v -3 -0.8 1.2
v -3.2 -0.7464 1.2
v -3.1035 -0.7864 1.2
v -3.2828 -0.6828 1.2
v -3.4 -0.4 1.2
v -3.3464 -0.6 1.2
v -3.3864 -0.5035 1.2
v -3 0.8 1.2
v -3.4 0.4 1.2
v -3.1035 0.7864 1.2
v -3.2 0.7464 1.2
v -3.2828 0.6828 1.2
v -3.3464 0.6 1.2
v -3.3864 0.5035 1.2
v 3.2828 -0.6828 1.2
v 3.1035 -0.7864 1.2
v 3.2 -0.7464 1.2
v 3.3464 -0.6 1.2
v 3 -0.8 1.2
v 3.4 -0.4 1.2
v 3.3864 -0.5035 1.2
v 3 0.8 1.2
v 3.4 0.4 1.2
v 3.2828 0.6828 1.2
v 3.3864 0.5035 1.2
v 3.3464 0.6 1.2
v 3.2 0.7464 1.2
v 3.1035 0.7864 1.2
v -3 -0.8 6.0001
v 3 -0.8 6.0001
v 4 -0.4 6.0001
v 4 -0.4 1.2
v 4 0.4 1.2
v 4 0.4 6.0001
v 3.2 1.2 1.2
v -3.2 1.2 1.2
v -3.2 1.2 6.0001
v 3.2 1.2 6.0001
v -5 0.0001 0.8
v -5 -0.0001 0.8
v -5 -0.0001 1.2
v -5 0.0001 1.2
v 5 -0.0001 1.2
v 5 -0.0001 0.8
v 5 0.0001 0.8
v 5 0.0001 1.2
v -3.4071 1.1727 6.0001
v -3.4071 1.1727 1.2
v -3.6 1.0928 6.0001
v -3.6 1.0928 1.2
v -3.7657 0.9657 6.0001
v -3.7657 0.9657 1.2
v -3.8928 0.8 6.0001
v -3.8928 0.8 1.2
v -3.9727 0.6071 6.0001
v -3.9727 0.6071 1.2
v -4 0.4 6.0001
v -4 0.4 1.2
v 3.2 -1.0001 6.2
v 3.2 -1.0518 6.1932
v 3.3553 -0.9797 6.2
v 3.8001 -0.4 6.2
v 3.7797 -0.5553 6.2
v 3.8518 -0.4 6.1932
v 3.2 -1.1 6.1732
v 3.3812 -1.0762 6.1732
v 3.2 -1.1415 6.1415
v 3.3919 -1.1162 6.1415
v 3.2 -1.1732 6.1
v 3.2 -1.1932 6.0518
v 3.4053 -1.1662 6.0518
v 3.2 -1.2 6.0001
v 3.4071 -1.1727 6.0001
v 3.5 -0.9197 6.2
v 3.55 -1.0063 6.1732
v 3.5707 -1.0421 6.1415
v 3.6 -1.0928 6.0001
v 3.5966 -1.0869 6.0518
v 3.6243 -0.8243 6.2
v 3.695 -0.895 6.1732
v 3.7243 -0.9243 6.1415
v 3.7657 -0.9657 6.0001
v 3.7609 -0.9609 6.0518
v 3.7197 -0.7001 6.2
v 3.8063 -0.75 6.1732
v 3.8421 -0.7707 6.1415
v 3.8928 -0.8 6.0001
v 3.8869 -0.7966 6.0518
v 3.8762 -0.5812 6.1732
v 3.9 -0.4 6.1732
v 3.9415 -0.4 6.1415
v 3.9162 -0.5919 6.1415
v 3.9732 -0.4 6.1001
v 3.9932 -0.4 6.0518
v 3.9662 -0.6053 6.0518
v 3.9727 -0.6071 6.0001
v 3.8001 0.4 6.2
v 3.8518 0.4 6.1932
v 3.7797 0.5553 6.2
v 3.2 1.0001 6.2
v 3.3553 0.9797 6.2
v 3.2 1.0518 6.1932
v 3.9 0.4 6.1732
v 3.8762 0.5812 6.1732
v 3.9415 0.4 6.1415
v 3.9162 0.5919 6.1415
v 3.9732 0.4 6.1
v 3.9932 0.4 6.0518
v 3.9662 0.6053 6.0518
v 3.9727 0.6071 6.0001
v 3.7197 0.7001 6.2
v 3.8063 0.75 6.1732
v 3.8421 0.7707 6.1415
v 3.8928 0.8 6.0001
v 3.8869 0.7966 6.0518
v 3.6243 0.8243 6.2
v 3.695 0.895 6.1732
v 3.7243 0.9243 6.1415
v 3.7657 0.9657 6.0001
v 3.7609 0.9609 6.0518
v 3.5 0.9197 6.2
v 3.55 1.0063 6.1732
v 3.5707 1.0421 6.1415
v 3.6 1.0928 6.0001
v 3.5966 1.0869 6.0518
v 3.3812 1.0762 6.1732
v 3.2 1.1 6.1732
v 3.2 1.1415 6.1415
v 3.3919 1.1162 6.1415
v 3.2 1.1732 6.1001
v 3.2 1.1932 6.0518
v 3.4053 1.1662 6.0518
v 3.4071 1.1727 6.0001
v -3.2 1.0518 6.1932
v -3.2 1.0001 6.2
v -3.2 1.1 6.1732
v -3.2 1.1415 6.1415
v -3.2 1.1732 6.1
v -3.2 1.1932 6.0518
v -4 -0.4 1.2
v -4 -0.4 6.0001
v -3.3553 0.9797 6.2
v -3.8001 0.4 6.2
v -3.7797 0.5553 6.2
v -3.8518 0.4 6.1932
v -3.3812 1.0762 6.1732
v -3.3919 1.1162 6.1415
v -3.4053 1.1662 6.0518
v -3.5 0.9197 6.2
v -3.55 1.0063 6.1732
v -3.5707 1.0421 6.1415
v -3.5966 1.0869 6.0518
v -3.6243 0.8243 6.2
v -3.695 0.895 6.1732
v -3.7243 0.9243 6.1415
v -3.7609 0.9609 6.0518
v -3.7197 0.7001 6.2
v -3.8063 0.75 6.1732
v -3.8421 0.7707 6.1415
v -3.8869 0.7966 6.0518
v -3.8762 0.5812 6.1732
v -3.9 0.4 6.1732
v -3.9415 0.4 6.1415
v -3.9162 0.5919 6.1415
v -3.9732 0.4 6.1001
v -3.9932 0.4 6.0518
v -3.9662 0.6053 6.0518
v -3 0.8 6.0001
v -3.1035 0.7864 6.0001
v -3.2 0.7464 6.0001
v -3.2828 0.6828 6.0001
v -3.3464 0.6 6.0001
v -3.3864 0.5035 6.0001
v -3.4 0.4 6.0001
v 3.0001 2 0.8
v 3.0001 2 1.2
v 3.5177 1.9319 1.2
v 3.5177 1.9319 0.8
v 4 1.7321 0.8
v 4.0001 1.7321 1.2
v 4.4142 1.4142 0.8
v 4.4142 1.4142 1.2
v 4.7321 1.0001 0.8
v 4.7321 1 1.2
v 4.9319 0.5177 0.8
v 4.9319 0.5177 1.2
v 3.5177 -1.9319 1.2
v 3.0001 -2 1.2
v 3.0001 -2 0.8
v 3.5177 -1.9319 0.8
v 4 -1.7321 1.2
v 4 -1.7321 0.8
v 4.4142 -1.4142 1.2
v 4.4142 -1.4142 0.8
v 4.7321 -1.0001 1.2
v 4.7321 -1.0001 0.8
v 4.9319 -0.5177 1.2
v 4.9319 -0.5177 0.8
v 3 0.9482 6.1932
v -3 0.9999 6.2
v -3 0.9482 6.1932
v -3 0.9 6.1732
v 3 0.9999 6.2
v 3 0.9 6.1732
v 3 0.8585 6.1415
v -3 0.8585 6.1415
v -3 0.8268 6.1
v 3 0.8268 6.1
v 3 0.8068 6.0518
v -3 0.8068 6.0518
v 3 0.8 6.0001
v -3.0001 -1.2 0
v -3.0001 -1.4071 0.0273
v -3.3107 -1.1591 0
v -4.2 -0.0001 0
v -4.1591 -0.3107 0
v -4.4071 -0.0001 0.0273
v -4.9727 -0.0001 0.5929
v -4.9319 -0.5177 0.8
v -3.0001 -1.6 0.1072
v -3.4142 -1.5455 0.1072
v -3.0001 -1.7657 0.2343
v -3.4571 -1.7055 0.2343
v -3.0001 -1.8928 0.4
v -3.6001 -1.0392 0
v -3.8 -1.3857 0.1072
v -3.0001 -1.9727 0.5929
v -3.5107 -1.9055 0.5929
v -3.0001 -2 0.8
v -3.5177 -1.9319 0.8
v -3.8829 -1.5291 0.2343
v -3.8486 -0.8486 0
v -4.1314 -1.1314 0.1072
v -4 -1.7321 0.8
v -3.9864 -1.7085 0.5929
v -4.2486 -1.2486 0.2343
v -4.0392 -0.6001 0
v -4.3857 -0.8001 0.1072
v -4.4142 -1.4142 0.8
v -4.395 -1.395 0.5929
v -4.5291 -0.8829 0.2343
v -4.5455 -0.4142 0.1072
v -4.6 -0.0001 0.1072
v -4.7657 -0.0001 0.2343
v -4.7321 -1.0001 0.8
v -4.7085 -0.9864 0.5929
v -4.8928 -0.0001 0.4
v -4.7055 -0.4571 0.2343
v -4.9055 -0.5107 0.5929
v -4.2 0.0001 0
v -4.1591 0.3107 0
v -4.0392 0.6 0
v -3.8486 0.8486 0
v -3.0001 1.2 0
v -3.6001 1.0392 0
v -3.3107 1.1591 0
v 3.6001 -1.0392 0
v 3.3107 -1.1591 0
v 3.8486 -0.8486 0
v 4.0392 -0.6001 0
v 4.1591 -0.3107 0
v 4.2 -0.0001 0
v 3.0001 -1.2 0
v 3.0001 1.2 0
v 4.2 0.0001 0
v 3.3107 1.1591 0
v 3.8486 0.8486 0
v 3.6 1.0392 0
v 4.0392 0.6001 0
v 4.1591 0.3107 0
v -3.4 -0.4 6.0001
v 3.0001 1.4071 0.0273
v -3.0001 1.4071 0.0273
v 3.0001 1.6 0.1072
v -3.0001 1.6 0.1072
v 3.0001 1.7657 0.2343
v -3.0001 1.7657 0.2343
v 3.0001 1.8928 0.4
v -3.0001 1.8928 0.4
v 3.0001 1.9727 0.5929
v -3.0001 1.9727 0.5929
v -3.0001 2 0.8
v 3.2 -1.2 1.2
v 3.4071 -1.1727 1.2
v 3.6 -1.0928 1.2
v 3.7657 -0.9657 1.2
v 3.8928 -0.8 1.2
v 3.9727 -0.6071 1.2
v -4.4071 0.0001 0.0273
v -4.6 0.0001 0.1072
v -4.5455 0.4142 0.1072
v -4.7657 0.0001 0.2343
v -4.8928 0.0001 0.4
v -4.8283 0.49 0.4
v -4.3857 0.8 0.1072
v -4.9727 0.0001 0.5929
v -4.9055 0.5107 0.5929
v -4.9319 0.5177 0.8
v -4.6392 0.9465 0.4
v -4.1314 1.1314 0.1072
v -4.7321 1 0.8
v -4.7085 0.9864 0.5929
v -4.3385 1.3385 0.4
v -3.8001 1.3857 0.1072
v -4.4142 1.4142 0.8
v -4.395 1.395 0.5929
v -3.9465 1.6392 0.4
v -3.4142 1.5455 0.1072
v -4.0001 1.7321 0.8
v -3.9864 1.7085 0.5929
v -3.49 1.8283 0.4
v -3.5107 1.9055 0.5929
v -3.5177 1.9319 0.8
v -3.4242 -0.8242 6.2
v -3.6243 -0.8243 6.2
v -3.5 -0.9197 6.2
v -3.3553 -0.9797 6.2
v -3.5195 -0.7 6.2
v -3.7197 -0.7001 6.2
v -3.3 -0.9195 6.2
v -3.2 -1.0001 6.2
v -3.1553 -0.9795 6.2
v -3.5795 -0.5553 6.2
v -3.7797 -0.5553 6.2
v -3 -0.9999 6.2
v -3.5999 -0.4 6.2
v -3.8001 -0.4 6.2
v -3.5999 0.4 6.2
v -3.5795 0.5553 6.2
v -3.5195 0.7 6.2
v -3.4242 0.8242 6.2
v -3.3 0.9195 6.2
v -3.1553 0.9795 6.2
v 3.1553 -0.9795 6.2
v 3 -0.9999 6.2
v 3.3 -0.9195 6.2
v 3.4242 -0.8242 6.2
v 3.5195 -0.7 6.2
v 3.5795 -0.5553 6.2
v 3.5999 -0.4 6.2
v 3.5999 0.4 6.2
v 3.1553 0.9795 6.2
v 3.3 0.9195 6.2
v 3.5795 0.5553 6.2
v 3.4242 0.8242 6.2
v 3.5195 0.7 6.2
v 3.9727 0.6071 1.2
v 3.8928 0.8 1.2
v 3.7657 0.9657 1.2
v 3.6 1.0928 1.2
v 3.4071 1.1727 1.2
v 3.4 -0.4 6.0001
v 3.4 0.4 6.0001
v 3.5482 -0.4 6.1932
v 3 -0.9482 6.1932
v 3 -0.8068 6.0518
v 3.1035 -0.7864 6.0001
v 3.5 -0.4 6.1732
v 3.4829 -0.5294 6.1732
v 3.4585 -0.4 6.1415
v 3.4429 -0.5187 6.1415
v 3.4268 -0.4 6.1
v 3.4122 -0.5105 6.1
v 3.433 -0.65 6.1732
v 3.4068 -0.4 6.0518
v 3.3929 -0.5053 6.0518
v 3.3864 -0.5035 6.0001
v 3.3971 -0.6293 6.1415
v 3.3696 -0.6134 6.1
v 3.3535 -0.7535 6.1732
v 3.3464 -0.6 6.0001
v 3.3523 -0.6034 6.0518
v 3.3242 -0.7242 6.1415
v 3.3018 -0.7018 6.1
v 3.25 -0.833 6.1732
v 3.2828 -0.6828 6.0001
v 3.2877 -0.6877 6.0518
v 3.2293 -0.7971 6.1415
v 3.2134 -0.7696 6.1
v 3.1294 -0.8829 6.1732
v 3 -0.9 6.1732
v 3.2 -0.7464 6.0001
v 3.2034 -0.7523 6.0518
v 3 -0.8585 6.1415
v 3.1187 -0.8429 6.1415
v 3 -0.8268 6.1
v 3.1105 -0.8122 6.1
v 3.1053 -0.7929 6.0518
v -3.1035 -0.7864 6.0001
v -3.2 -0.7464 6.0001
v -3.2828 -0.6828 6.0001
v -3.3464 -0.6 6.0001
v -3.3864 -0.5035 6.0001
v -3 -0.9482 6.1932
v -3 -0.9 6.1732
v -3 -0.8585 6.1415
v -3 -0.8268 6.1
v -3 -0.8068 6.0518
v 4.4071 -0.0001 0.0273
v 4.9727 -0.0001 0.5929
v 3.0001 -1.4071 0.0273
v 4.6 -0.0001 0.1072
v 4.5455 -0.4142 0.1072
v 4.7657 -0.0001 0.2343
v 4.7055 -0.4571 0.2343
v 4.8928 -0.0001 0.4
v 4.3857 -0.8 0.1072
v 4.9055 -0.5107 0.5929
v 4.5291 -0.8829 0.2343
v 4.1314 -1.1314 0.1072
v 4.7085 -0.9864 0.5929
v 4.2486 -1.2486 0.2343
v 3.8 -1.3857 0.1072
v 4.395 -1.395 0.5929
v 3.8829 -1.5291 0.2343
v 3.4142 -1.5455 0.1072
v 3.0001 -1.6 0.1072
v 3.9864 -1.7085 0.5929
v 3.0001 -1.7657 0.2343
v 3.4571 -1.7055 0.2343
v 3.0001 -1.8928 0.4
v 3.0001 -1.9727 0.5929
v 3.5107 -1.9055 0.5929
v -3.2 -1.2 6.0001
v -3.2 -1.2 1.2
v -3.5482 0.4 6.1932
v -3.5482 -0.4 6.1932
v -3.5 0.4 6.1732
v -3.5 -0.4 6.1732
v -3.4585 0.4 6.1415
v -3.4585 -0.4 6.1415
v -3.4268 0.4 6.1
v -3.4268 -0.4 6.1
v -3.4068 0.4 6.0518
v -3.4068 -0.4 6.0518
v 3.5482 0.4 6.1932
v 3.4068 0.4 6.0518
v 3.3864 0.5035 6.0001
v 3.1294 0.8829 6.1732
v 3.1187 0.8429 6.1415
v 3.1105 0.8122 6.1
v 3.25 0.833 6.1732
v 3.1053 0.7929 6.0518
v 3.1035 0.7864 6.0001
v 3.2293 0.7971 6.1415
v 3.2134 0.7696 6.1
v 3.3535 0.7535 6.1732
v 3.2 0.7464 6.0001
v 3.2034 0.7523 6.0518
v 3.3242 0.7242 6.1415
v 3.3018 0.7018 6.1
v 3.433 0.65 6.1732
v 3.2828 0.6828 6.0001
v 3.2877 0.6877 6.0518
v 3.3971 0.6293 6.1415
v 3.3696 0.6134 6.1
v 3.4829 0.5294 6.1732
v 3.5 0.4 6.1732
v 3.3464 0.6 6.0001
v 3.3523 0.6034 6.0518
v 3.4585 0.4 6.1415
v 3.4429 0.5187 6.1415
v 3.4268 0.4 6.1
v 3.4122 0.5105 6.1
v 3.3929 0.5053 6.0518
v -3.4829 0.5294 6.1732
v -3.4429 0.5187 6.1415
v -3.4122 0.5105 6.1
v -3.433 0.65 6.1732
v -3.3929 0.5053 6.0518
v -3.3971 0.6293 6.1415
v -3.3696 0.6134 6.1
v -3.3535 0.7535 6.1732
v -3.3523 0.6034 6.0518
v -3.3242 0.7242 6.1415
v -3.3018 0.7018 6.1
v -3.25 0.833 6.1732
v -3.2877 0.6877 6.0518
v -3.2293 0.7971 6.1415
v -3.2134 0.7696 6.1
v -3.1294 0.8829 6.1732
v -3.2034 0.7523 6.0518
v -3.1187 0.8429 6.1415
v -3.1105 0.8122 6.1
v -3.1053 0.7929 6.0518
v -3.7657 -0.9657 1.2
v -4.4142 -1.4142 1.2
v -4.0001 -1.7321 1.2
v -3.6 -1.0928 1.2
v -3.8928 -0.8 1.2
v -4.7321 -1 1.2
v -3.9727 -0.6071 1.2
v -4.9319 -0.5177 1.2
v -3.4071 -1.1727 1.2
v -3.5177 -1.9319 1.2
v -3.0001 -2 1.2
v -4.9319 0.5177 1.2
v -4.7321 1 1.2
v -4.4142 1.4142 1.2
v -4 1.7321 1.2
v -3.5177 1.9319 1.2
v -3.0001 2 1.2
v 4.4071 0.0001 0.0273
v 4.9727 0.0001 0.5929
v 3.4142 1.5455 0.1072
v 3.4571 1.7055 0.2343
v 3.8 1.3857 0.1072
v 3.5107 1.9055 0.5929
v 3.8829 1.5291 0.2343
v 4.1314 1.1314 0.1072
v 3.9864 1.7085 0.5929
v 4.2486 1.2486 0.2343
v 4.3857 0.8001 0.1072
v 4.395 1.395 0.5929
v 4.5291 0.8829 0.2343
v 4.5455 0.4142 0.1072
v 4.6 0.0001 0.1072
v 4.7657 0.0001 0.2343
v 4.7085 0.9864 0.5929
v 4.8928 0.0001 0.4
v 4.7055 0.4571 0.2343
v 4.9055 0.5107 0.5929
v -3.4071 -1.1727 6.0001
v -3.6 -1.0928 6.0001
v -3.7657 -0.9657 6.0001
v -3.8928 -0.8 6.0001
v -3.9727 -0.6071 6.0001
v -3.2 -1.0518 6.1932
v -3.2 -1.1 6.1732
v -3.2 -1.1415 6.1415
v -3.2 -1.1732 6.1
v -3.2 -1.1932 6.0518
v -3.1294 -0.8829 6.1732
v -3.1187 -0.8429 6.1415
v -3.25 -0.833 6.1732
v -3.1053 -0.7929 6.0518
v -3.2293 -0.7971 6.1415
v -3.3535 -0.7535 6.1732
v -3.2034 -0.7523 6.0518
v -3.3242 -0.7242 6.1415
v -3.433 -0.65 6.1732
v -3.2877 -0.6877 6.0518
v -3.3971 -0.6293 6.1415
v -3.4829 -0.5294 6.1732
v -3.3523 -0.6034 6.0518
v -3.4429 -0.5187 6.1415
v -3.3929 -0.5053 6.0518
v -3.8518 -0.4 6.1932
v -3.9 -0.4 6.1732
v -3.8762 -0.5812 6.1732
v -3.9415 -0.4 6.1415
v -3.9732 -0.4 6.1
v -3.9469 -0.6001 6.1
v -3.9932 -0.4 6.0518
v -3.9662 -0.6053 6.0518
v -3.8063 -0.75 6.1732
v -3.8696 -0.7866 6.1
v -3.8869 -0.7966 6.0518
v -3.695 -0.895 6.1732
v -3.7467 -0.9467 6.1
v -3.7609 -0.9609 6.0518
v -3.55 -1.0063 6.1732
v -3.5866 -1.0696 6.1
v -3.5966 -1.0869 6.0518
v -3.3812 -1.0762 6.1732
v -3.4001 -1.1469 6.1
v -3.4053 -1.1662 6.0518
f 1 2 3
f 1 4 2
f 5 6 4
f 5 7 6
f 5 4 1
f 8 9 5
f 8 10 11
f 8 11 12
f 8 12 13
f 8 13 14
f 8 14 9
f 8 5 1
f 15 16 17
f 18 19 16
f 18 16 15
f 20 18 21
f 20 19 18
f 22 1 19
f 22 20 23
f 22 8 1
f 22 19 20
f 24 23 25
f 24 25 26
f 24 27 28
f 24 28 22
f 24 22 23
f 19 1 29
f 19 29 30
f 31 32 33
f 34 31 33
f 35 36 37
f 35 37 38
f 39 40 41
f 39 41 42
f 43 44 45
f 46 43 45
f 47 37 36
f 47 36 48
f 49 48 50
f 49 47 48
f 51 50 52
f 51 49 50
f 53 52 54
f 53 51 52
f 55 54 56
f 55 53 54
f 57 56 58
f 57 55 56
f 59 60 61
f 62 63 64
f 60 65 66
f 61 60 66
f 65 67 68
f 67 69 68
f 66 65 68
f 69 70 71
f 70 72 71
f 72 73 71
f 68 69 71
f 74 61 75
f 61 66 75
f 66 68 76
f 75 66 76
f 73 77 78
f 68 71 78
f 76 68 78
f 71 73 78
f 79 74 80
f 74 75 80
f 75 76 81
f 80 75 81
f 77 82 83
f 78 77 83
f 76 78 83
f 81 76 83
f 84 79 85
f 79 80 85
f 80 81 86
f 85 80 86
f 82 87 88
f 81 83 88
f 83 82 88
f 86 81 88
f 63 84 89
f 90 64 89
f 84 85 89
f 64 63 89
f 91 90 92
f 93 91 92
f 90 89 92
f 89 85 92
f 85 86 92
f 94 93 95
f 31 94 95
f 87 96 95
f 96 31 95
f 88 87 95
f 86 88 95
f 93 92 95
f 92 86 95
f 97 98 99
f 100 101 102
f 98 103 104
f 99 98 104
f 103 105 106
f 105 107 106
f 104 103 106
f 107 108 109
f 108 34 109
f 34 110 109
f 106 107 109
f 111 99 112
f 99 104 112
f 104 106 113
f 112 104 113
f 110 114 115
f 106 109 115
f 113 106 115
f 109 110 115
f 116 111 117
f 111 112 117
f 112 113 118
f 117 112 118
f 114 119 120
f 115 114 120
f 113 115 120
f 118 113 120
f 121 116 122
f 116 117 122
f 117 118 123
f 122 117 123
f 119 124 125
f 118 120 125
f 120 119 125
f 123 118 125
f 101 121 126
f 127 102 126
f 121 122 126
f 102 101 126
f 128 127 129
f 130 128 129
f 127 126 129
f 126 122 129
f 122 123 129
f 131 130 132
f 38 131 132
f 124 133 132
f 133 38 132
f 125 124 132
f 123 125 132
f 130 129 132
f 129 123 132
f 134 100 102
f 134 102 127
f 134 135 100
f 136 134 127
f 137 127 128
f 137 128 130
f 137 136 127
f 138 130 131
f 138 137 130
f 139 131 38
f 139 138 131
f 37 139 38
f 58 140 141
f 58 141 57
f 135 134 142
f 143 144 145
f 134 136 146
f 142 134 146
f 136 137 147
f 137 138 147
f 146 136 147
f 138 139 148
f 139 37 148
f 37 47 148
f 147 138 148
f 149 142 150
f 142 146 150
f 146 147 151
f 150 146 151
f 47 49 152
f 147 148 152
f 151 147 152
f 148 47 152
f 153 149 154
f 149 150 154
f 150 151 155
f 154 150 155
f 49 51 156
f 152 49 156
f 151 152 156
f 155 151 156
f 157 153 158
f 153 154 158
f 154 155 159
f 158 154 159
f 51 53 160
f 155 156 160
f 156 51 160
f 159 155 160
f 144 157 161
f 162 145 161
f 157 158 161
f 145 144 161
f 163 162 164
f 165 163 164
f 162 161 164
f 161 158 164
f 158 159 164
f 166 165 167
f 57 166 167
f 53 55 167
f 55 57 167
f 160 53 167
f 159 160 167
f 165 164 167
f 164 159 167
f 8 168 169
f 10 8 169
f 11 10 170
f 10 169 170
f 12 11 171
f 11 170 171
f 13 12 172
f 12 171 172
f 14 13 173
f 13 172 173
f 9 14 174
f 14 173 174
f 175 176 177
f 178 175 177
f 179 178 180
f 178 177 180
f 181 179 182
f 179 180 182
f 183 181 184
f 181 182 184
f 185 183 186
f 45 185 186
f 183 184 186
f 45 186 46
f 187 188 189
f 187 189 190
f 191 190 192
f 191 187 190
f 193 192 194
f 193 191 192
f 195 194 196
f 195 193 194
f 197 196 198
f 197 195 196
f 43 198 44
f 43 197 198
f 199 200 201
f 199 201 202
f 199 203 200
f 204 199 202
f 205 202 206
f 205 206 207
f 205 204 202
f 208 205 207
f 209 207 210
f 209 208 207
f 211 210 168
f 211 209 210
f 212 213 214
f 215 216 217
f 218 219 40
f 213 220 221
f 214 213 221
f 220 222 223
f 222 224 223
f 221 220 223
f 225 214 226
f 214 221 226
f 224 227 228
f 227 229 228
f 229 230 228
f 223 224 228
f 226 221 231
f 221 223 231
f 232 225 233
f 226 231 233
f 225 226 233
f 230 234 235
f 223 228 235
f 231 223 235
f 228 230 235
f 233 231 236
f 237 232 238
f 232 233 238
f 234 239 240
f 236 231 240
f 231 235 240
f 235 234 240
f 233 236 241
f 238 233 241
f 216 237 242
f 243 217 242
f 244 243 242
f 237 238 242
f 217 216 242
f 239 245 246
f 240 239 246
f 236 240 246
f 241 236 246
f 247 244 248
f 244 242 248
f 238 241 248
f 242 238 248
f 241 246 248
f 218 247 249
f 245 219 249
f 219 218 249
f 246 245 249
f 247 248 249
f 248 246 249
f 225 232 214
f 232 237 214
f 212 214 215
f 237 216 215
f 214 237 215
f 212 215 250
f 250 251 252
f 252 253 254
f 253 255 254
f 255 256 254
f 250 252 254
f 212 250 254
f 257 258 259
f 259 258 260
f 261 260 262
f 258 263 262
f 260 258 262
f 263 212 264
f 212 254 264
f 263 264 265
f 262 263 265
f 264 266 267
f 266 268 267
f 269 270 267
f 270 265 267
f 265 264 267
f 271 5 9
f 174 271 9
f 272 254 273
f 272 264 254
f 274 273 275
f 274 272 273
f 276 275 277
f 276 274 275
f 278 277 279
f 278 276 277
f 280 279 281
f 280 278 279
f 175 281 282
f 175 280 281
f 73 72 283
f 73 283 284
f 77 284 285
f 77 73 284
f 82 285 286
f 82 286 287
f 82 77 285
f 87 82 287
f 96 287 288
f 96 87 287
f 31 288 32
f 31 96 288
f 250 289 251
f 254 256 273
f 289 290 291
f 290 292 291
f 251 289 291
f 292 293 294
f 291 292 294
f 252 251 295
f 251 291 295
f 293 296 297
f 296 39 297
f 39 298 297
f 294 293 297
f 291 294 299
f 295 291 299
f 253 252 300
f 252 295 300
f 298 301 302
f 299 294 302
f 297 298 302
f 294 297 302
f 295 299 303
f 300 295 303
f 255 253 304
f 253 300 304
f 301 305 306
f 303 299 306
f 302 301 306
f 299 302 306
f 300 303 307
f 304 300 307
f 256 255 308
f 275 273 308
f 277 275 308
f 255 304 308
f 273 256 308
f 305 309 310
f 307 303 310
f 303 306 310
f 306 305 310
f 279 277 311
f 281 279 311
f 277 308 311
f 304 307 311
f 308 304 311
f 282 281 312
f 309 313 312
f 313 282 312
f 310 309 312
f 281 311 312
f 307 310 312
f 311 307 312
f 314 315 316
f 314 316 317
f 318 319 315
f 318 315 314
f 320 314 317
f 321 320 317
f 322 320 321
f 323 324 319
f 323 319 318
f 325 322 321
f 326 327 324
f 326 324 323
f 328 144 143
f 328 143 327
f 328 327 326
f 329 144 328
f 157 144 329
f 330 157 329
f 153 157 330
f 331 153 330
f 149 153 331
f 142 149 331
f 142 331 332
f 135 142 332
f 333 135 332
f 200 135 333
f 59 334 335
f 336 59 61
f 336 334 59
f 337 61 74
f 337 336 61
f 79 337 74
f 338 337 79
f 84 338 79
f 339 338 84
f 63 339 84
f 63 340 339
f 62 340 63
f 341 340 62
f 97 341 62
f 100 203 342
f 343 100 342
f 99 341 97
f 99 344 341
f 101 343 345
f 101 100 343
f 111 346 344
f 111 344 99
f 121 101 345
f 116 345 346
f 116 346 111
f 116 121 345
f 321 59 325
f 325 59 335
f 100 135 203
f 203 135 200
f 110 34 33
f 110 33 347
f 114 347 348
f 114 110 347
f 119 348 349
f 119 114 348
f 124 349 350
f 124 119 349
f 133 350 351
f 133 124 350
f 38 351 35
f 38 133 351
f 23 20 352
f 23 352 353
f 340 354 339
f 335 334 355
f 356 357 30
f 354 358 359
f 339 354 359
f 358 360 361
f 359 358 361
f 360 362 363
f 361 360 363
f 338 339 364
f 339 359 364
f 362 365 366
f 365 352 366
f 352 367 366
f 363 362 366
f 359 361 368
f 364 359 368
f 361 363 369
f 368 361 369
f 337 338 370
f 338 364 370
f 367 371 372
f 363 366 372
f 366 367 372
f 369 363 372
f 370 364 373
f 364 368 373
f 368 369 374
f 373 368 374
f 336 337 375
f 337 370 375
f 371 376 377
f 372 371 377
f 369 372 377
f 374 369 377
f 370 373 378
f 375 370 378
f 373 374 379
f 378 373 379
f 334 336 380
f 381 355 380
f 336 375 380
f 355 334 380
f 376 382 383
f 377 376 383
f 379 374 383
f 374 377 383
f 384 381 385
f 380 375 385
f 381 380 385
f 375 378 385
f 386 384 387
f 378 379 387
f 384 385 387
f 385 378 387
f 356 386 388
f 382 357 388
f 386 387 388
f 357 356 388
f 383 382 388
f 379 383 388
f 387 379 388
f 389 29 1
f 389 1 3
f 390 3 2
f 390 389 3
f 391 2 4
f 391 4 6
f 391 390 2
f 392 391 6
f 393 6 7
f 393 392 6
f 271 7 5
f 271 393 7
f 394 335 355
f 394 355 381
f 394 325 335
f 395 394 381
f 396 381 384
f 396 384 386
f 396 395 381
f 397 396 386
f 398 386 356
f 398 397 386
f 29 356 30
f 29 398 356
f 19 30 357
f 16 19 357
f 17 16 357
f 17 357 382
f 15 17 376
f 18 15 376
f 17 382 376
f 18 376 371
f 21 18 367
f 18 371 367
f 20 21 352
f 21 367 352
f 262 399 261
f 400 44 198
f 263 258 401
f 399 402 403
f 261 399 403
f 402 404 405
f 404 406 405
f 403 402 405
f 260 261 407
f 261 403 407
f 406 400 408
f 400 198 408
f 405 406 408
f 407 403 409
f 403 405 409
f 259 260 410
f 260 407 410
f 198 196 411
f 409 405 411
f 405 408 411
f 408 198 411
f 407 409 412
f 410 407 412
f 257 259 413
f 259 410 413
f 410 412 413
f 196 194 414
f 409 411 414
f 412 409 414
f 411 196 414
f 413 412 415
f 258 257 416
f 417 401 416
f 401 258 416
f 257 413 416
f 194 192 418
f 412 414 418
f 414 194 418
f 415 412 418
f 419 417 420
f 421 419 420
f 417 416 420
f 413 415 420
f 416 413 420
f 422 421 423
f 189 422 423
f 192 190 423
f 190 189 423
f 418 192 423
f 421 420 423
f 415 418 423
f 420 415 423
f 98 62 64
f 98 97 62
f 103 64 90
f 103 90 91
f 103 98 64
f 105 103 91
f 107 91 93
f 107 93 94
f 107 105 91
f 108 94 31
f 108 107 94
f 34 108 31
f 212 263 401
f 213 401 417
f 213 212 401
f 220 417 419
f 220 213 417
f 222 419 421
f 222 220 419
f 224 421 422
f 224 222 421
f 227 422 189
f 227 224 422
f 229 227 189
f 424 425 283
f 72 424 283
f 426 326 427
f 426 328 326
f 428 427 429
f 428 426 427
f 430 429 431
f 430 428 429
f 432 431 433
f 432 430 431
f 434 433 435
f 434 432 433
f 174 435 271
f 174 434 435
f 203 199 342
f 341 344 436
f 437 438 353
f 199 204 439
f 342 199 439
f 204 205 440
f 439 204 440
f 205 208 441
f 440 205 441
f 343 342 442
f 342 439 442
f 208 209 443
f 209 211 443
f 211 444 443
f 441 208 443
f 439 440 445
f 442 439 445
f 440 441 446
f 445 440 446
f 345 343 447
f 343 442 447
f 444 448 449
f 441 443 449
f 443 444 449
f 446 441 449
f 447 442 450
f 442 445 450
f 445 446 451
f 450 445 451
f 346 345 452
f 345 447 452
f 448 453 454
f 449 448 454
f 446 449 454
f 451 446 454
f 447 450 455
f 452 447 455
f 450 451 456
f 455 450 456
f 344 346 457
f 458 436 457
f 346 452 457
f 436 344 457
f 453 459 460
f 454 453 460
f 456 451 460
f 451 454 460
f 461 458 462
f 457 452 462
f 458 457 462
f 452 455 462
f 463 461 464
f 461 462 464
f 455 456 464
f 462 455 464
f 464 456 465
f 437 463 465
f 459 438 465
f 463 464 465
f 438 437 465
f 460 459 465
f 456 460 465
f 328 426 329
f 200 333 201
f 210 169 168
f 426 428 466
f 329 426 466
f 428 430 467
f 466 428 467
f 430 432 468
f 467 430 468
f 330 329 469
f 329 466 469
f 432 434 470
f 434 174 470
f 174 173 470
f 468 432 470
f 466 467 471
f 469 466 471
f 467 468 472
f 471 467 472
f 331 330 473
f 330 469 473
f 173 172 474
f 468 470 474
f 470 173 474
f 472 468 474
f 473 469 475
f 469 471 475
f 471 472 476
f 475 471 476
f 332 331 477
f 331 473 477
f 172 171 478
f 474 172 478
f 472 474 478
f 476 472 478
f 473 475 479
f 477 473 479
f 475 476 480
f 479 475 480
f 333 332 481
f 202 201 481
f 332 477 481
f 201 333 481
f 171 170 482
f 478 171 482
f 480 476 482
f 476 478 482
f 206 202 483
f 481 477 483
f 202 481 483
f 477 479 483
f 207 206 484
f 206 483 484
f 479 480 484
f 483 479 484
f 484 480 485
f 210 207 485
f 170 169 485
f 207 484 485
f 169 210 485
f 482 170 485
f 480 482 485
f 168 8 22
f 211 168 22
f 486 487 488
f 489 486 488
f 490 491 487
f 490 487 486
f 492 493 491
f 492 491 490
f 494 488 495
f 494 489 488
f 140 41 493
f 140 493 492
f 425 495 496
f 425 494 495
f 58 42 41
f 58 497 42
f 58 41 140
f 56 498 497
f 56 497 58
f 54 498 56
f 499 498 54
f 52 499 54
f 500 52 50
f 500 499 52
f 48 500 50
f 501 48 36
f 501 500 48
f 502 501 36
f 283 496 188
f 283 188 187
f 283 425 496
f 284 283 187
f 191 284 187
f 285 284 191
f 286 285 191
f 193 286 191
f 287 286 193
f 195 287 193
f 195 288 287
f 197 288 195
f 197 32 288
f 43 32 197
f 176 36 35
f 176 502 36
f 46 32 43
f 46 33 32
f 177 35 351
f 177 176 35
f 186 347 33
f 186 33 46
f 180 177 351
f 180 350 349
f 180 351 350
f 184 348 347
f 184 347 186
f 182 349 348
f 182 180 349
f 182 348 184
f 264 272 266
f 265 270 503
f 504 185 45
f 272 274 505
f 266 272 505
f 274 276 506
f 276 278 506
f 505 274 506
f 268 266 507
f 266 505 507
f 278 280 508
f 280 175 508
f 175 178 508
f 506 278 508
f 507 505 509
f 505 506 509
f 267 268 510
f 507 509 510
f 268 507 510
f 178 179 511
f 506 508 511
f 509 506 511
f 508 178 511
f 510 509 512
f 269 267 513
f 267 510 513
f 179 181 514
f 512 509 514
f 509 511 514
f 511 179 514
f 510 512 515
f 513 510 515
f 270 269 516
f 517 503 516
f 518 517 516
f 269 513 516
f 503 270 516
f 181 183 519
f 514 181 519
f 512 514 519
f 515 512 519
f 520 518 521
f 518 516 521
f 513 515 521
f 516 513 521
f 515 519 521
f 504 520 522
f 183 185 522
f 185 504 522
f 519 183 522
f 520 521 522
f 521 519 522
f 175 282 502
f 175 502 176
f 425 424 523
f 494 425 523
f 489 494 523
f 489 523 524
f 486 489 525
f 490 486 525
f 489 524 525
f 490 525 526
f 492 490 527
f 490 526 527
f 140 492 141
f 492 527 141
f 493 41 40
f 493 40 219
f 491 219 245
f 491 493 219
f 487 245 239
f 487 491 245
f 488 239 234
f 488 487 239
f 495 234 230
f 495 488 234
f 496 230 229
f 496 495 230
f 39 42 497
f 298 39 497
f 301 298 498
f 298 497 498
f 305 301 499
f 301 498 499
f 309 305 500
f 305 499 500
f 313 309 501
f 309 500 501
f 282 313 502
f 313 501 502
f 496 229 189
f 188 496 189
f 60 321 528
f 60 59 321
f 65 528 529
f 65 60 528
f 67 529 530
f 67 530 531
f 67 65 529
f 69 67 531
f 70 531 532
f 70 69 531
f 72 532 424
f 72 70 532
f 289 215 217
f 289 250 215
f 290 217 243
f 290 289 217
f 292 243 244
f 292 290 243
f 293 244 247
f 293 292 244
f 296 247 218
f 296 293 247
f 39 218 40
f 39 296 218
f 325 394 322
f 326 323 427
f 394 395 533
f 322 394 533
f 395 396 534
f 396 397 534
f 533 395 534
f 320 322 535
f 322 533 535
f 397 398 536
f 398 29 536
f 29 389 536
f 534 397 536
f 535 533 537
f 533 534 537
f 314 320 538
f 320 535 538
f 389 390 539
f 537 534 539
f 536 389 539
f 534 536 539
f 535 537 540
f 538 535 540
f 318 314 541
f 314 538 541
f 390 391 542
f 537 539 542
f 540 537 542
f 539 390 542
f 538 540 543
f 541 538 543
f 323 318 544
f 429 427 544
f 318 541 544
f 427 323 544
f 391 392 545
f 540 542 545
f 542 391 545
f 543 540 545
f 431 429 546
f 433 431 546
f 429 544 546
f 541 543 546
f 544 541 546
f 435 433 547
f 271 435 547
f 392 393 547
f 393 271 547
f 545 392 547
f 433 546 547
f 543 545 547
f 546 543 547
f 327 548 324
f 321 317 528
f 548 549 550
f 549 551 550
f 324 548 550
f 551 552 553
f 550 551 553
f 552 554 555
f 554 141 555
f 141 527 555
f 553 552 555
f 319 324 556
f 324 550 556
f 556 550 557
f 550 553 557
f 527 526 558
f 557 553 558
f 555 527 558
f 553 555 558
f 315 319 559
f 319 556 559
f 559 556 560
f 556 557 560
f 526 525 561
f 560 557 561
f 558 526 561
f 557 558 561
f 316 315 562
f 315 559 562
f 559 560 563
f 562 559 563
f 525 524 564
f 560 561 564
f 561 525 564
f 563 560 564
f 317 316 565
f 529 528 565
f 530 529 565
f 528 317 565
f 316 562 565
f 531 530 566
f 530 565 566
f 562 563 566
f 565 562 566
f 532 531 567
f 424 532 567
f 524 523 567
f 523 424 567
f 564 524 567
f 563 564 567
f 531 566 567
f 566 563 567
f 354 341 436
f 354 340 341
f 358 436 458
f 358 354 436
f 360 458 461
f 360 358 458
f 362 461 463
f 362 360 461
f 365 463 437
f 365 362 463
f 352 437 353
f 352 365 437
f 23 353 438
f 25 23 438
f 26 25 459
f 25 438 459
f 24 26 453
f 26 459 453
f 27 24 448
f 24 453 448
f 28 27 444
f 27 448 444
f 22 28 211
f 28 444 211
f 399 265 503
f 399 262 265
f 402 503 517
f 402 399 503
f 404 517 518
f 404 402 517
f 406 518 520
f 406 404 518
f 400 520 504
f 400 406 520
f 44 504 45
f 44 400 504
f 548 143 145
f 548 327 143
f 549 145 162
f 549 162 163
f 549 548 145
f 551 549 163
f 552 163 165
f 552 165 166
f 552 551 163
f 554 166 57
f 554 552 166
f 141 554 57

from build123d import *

# Parameters (mm, degrees)
SKETCH_1_W      = 10
SKETCH_1_H      = 4
EXTRUDE_1_DEPTH = 1.2
SKETCH_2_W      = 8
SKETCH_2_H      = 2.4
SKETCH_2_W_2    = 6.8
SKETCH_2_H_2    = 1.6
EXTRUDE_2_DEPTH = 5
FILLET_1_R      = 2
FILLET_2_R      = 0.8
FILLET_3_R      = 0.8
FILLET_4_R      = 0.4
FILLET_5_R      = 0.2


with BuildPart() as part:
    # Эскиз1 → Бобышка-Вытянуть1 (new body)
    with BuildSketch(Plane.XY):
        Rectangle(SKETCH_1_W, SKETCH_1_H)
    extrude(amount=EXTRUDE_1_DEPTH)

    # Эскиз2 → Бобышка-Вытянуть2 (add)
    with BuildSketch(Plane.XY.offset(1.2)):
        Rectangle(SKETCH_2_W, SKETCH_2_H)
        Rectangle(SKETCH_2_W_2, SKETCH_2_H_2, mode=Mode.SUBTRACT)
    extrude(amount=EXTRUDE_2_DEPTH)

    # Скругление1
    fillet_1_edges = [part.edges().sort_by_distance(p)[0] for p in [
        (5, 2, 0.6),
        (5, -2, 0.6),
        (-5, -2, 0.6),
        (-5, 2, 0.6),
    ]]
    fillet(fillet_1_edges, radius=FILLET_1_R - 0.0001)  # a hair under: the kernel refuses the full size

    # Скругление2
    fillet_2_edges = [part.edges().sort_by_distance(p)[0] for p in [
        (0, 2, 0),
        (0, -2, 0),
        (-4.414242852, 1.414242852, 0),
        (-4.414242852, -1.414242852, 0),
        (4.414242852, -1.414242852, 0),
        (4.414242852, 1.414242852, 0),
    ]]
    fillet(fillet_2_edges, radius=FILLET_2_R)

    # Скругление3
    fillet_3_edges = [part.edges().sort_by_distance(p)[0] for p in [
        (4, -1.2, 3.7),
        (4, 1.2, 3.7),
        (-4, 1.2, 3.7),
        (-4, -1.2, 3.7),
    ]]
    fillet(fillet_3_edges, radius=FILLET_3_R)

    # Скругление4
    fillet_4_edges = [part.edges().sort_by_distance(p)[0] for p in [
        (3.4, 0.8, 3.7),
        (-3.4, 0.8, 3.7),
        (-3.4, -0.8, 3.7),
        (3.4, -0.8, 3.7),
    ]]
    fillet(fillet_4_edges, radius=FILLET_4_R)

    # Скругление5
    fillet_5_edges = [part.edges().sort_by_distance(p)[0] for p in [
        (-3.4, 0, 6.2),
        (0, -0.8, 6.2),
        (3.4, 0, 6.2),
        (0, 0.8, 6.2),
        (-3.282842712, -0.682842712, 6.2),
        (3.282842712, -0.682842712, 6.2),
        (3.282842712, 0.682842712, 6.2),
        (-3.282842712, 0.682842712, 6.2),
        (0, -1.2, 6.2),
        (-4, 0, 6.2),
        (4, 0, 6.2),
        (0, 1.2, 6.2),
        (-3.765685425, 0.965685425, 6.2),
        (3.765685425, 0.965685425, 6.2),
        (3.765685425, -0.965685425, 6.2),
        (-3.765685425, -0.965685425, 6.2),
    ]]
    fillet(fillet_5_edges, radius=FILLET_5_R - 0.0001)  # a hair under: the kernel refuses the full size


solid = part.part
